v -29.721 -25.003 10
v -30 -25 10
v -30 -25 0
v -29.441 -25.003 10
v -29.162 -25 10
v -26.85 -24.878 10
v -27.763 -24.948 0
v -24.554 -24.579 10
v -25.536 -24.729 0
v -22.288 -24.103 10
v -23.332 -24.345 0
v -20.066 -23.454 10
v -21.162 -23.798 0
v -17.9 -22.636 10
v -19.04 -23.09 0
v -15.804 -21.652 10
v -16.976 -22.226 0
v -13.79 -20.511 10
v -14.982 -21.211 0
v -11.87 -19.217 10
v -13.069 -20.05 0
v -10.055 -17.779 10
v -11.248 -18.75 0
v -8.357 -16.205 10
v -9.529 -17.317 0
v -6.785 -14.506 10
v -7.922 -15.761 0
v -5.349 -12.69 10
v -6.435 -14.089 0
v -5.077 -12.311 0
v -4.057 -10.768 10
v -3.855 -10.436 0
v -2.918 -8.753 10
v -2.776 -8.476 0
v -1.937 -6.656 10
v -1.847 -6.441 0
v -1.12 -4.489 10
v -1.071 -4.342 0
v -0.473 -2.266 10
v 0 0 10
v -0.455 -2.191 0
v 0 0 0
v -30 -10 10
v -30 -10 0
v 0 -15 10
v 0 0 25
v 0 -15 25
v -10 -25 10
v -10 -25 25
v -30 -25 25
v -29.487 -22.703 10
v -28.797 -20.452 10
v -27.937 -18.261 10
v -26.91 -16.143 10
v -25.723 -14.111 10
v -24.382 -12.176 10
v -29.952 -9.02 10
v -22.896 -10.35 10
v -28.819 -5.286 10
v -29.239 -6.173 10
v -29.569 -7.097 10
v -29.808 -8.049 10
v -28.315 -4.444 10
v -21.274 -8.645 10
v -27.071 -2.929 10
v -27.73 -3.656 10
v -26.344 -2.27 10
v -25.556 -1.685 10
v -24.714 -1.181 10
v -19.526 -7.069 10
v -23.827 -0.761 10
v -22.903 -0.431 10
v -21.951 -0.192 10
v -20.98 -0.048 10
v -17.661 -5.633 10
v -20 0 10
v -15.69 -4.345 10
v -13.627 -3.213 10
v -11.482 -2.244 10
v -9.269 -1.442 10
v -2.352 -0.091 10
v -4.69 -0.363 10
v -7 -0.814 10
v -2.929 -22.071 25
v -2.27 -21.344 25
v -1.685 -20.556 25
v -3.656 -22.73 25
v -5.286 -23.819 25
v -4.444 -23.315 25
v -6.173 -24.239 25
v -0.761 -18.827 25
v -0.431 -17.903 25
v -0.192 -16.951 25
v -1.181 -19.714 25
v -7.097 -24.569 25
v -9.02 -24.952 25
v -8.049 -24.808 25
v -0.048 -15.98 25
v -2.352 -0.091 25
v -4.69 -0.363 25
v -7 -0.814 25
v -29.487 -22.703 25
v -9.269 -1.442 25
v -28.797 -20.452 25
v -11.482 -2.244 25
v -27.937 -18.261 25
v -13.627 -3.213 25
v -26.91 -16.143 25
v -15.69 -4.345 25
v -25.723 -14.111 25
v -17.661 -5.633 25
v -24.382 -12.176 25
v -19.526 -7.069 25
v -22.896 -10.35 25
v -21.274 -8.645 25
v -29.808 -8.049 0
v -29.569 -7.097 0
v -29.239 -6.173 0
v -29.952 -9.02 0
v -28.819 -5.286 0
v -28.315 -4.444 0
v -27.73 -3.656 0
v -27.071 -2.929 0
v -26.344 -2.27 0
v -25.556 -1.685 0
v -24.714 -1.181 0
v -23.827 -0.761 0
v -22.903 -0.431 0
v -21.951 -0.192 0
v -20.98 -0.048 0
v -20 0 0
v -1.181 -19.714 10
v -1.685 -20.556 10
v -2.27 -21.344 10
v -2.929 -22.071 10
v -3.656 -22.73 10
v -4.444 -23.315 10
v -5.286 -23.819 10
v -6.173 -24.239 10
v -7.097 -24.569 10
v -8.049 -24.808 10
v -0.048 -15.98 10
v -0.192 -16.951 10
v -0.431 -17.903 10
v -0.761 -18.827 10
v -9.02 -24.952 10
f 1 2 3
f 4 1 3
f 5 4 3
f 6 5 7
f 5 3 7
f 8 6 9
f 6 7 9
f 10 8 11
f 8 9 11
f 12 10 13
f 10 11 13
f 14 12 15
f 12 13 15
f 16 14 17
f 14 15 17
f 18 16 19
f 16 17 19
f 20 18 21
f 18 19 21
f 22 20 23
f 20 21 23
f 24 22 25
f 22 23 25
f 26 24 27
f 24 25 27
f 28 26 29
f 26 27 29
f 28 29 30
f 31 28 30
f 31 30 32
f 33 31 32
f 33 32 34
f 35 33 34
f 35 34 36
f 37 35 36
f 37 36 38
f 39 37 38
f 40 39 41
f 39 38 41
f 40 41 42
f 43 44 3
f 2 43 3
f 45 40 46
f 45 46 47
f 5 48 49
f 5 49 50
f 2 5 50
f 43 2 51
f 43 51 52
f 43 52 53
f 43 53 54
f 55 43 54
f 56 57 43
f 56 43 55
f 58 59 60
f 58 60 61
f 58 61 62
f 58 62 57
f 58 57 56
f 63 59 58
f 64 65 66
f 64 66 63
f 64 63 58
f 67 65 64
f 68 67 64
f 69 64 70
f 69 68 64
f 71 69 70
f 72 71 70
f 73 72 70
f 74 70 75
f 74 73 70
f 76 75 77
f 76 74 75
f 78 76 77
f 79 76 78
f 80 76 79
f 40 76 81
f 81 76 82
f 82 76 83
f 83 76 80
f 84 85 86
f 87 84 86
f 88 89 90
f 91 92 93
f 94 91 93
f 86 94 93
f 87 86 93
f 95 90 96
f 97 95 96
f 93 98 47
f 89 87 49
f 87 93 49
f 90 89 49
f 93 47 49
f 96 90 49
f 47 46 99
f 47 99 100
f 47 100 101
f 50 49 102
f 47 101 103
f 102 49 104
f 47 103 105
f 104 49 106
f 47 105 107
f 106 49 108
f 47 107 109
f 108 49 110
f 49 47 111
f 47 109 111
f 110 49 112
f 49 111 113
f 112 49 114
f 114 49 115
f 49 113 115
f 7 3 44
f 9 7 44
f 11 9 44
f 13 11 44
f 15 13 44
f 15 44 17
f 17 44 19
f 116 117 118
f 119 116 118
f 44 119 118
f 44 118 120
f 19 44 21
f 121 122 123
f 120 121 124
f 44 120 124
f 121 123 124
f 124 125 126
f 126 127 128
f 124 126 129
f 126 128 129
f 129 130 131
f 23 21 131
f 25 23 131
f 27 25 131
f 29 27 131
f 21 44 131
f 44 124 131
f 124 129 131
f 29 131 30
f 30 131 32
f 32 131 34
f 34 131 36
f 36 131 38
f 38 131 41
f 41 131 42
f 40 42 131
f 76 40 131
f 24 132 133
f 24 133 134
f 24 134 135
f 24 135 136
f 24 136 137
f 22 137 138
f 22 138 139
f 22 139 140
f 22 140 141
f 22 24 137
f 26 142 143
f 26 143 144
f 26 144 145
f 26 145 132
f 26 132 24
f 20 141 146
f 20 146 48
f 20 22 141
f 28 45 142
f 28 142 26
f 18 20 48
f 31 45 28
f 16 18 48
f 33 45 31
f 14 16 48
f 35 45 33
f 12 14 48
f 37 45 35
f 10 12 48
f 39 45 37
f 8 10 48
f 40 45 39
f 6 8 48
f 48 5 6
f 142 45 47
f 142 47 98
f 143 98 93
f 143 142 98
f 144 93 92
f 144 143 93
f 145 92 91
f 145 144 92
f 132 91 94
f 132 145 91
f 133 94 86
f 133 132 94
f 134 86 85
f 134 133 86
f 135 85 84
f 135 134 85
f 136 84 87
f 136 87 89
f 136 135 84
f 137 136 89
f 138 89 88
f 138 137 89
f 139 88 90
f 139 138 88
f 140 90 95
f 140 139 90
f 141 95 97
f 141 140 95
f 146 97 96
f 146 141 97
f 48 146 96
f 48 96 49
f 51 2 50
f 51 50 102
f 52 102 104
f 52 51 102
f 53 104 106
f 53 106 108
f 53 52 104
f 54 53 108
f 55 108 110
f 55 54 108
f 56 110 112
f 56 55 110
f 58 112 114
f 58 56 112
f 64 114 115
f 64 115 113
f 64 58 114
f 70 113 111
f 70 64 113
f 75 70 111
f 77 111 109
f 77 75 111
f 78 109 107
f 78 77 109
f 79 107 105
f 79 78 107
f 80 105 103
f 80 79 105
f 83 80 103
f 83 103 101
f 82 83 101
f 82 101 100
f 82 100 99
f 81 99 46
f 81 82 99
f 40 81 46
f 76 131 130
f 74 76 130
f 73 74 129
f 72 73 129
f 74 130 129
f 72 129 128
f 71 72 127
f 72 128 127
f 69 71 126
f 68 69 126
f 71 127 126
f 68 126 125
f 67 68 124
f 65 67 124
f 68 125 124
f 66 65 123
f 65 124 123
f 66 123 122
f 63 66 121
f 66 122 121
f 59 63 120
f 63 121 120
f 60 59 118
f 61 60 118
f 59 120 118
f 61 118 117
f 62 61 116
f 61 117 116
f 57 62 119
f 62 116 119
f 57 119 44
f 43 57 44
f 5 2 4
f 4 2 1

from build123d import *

# Parameters (mm, degrees)
BOSS_EXTRUDE1_DEPTH = 10
BOSS_EXTRUDE2_DEPTH = 15


with BuildPart() as part:
    # Sketch1 → Boss-Extrude1 (new body)
    with BuildSketch(Plane.XY):
        with BuildLine():
            Line((0, 0), (-20, 0))
            ThreePointArc((-20, 0), (-27.071067812, -2.928932188), (-30, -10))
            Line((-30, -10), (-30, -25))
            ThreePointArc((-30, -25), (-10.375361639, -18.049566033), (0, 0))
        make_face()
    extrude(amount=BOSS_EXTRUDE1_DEPTH)

    # Sketch2 → Boss-Extrude2 (add)
    with BuildSketch(Plane.XY.offset(10)):
        with BuildLine():
            Line((0, 0), (0, -15))
            ThreePointArc((0, -15), (-2.928932188, -22.071067812), (-10, -25))
            Line((-10, -25), (-30, -25))
            ThreePointArc((-30, -25), (-19.52562419, -7.069250972), (0, 0))
        make_face()
    extrude(amount=BOSS_EXTRUDE2_DEPTH)


solid = part.part
